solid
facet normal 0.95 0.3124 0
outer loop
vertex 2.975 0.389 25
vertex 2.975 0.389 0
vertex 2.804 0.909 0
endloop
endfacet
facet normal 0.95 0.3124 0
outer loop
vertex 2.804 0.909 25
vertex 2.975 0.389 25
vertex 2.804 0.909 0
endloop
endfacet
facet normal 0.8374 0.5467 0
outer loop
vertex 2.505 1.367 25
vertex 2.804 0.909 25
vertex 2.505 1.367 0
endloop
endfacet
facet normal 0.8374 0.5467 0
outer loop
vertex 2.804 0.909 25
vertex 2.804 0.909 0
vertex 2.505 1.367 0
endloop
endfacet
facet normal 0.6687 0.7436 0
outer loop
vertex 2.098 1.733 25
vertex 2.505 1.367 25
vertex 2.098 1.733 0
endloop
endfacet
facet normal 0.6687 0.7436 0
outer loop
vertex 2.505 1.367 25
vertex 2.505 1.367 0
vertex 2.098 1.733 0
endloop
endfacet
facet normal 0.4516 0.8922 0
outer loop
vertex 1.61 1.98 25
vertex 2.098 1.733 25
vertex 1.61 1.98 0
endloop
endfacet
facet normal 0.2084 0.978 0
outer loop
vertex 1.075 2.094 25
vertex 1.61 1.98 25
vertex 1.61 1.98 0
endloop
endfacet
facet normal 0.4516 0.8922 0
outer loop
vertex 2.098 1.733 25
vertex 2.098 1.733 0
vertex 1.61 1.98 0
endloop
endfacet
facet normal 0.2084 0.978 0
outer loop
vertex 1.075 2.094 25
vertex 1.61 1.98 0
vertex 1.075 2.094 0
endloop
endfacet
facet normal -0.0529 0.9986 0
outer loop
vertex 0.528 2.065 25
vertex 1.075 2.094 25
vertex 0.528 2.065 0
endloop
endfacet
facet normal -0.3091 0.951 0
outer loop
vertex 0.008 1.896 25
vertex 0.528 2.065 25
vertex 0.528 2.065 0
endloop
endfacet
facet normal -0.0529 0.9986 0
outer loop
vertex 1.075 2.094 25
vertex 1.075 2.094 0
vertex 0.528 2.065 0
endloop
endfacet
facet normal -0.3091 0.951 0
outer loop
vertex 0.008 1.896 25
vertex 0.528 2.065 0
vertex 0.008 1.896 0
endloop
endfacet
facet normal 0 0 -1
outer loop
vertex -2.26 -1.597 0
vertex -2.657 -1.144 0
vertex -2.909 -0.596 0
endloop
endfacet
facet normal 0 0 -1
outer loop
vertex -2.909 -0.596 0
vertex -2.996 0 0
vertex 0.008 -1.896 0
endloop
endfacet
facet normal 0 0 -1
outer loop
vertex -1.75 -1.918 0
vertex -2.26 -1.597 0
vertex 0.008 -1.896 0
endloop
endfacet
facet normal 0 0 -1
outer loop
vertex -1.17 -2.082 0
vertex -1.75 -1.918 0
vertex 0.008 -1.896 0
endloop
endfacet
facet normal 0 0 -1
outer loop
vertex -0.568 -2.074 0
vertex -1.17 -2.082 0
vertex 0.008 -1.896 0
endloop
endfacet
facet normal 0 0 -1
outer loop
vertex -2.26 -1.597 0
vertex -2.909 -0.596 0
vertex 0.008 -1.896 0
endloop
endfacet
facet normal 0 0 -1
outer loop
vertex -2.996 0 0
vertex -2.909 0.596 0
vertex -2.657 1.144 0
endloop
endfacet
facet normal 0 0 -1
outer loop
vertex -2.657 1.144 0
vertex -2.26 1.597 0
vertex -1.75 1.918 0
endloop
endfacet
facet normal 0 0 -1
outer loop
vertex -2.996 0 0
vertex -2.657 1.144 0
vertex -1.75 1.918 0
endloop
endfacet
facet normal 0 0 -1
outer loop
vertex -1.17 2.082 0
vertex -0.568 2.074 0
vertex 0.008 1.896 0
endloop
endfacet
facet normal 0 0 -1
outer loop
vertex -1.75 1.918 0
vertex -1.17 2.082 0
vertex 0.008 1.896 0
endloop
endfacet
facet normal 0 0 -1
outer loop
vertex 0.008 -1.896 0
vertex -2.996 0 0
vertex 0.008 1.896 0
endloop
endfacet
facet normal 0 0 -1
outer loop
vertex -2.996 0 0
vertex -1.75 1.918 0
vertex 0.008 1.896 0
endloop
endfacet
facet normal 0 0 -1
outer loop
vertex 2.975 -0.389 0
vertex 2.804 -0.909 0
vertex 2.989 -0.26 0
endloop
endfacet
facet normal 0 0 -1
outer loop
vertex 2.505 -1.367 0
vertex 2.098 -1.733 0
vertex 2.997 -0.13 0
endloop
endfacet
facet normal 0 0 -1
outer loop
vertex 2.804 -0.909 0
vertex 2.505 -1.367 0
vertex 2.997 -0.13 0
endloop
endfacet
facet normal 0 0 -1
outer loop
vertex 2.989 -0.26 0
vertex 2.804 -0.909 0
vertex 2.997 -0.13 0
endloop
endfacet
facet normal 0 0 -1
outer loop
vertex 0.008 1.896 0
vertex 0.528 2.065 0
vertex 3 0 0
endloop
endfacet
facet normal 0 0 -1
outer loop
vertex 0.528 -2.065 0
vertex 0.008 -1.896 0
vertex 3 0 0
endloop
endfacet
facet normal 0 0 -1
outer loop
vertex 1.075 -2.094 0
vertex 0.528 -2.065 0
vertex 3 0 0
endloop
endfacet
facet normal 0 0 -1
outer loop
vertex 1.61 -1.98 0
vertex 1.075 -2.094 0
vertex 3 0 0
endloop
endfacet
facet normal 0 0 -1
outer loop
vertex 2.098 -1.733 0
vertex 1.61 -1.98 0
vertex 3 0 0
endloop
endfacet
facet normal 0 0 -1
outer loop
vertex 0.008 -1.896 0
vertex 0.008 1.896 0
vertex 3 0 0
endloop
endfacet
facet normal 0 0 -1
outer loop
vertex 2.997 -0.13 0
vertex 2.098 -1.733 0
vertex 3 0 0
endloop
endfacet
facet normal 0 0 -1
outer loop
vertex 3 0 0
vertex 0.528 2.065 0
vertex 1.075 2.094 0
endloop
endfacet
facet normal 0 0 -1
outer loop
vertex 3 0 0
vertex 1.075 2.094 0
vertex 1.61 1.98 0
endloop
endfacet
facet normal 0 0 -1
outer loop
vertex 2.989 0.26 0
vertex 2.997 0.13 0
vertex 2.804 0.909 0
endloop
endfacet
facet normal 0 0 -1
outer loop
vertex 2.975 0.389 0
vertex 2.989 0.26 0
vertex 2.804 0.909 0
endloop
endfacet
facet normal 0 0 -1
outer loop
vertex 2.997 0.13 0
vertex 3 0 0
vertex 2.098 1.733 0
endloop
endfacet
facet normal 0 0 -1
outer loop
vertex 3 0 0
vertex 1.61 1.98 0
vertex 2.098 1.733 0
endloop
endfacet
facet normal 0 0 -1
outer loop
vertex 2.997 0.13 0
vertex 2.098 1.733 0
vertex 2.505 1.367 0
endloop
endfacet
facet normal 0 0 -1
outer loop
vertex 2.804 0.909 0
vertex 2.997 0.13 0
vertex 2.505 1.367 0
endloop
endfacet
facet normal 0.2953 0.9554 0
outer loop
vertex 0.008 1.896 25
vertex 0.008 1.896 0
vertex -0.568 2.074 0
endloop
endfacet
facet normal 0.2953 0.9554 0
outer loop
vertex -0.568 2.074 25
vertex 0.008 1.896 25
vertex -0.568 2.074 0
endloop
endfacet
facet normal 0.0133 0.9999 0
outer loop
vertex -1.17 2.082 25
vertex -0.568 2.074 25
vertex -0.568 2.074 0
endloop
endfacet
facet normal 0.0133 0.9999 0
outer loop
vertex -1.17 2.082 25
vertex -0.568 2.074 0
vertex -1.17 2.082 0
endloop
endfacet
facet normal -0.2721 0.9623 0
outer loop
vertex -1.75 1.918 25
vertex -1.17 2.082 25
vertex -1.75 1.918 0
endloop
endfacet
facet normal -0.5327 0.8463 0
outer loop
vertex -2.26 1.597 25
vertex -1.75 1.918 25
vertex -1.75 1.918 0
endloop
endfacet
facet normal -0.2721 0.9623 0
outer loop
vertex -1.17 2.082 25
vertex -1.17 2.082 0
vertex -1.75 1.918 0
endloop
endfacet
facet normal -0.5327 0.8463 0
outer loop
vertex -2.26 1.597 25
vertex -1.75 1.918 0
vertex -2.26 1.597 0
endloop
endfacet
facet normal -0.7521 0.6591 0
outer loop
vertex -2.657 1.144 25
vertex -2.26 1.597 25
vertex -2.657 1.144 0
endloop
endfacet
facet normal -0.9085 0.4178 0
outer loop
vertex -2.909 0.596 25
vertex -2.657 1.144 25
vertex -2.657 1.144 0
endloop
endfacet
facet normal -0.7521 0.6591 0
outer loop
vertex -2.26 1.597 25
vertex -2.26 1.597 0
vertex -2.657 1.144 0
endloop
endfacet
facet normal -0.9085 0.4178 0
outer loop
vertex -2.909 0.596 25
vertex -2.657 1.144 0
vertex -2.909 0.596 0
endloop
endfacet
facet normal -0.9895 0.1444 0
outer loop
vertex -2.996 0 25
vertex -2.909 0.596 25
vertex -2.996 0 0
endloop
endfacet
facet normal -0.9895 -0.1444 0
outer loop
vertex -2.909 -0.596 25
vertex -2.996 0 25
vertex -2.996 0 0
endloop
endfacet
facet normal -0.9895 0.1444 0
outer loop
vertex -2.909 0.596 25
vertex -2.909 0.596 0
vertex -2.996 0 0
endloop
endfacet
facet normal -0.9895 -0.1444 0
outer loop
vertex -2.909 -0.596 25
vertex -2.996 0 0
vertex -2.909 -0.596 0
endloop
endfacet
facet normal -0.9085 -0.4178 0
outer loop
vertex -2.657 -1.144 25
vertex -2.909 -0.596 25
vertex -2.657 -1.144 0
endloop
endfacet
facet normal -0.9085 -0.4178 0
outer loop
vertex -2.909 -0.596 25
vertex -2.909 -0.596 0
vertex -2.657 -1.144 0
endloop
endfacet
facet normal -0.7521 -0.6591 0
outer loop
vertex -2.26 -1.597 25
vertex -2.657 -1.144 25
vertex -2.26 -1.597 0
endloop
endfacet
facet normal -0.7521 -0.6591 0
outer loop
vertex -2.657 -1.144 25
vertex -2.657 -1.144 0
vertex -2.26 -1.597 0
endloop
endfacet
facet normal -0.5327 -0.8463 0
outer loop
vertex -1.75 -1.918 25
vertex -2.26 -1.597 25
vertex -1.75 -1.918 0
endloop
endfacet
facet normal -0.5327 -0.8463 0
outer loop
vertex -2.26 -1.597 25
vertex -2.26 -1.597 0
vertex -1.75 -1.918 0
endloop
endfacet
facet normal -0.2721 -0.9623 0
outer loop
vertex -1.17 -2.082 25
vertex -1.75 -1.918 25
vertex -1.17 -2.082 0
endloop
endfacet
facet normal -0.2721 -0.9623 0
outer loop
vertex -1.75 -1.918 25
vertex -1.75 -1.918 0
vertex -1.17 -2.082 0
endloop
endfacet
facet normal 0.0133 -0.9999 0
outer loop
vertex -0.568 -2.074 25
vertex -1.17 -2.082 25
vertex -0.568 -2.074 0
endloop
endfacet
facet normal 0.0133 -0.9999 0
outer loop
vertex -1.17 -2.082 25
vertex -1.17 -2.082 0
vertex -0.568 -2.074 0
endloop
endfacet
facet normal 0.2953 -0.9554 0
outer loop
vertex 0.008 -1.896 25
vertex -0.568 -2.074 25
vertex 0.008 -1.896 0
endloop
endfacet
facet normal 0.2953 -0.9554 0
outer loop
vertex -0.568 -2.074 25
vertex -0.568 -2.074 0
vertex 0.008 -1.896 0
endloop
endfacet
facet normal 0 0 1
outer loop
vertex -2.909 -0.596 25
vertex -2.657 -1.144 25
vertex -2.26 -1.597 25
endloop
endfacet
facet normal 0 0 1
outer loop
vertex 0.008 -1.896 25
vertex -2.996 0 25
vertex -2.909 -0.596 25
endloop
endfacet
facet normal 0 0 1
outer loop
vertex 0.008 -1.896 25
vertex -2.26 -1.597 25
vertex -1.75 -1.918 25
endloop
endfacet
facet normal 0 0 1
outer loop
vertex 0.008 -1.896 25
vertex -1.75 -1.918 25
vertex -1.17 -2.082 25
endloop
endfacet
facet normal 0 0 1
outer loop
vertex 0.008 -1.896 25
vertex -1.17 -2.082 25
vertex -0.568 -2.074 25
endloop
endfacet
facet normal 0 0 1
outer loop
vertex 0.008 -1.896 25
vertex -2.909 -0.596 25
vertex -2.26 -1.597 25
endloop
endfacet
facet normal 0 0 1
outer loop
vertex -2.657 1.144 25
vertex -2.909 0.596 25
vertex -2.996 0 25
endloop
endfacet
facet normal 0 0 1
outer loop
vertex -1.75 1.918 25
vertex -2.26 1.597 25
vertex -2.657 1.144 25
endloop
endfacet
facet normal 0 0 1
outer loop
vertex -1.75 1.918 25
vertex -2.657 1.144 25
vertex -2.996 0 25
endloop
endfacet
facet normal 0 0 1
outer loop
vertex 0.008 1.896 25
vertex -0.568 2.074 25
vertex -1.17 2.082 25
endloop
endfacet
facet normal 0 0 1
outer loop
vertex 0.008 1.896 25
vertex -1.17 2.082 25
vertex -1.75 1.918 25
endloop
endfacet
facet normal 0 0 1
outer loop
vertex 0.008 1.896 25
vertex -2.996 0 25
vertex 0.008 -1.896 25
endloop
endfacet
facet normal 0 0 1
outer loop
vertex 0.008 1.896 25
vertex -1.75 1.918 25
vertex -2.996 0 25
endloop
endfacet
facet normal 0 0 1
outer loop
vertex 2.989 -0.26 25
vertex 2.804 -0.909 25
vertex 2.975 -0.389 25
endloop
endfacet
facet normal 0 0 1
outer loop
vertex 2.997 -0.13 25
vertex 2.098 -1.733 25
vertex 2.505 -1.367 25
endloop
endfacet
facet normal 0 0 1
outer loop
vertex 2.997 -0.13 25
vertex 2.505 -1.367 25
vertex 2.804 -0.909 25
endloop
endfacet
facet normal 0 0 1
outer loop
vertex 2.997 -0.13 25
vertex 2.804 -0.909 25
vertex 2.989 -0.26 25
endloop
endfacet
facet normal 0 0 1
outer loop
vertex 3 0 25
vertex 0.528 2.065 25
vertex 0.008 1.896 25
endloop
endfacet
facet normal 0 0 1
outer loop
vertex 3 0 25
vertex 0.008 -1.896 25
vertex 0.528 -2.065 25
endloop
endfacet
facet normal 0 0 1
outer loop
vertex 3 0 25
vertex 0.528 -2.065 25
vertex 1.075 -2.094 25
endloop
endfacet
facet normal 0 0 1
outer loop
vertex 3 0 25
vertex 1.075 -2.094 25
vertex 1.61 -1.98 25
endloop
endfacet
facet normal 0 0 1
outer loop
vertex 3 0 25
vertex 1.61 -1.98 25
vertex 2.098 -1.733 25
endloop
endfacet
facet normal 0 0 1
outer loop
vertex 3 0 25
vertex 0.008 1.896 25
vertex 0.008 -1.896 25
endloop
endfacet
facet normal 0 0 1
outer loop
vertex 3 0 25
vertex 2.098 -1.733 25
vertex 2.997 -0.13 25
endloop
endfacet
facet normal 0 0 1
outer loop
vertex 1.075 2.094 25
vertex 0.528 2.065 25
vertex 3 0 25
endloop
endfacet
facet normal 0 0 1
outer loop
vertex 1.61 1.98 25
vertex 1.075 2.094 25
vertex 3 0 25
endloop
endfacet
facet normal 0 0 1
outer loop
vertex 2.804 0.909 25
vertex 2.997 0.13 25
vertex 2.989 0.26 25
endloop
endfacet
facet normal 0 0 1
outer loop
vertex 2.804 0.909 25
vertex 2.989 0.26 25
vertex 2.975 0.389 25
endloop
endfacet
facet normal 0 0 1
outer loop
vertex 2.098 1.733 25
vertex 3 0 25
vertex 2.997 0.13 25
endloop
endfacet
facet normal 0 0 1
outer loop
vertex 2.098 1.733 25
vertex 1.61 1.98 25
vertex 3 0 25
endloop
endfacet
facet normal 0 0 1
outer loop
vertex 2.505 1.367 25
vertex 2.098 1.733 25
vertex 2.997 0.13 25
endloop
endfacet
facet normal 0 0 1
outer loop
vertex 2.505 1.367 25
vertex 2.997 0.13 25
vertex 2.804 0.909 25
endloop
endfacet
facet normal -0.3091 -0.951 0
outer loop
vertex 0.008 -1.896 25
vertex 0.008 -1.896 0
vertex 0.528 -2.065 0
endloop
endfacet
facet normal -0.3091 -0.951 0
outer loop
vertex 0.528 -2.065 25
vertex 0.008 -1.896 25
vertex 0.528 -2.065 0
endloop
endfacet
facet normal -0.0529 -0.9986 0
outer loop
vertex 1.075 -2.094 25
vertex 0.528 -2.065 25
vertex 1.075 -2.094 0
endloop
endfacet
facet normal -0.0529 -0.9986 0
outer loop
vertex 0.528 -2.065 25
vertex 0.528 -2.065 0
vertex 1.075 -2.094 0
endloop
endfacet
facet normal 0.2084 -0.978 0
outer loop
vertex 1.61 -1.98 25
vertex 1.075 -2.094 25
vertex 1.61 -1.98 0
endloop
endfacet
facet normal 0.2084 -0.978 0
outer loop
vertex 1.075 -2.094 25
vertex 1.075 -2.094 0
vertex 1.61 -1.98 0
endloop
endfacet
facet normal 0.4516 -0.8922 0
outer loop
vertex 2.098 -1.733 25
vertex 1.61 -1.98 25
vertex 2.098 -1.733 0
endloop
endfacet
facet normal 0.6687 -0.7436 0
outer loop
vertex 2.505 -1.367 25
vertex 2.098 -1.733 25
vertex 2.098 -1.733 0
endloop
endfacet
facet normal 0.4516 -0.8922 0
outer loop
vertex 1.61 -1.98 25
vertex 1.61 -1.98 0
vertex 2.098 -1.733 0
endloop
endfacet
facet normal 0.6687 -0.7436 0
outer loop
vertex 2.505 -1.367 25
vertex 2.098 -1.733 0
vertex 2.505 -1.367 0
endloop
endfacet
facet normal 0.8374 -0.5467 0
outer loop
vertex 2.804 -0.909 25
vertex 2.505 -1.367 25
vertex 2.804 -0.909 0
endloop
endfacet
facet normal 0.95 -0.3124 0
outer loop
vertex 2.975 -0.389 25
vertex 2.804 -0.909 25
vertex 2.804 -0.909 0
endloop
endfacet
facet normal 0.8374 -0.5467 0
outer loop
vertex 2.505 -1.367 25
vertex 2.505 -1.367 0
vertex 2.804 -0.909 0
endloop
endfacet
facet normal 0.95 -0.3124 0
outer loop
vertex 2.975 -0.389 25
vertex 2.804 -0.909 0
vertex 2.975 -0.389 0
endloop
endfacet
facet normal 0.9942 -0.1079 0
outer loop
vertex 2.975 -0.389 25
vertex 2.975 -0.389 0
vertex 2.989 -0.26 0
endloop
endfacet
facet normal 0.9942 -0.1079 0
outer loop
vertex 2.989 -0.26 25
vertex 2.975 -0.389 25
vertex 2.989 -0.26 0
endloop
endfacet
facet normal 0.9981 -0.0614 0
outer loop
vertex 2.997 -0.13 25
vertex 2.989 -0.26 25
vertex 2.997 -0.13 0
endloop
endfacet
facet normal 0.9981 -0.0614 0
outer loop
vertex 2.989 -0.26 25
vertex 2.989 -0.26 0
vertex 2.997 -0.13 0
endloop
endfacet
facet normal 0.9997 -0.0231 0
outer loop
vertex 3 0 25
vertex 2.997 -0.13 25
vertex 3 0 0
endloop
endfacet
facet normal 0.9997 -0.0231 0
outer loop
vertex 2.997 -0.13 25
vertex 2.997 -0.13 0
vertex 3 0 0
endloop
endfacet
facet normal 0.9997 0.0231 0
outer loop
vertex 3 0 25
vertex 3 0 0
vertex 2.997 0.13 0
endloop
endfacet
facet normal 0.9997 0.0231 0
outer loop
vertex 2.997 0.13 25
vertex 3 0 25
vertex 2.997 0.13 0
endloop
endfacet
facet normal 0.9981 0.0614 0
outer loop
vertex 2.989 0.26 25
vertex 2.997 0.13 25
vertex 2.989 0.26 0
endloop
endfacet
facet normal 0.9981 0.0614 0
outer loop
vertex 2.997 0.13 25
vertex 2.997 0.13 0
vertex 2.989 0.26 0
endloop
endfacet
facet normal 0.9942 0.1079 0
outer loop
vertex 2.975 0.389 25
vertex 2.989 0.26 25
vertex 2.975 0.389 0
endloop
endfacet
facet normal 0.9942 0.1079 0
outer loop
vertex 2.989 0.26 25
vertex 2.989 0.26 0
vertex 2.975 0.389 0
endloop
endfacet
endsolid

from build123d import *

# Parameters (mm, degrees)
F1_DEPTH = 25


with BuildPart() as f1:
    # F0 (on Top) → F1 (new body)
    with BuildSketch(Plane.XY):
        with BuildLine():
            ThreePointArc((2.9746431824, -0.3892273592), (2.9936540838, -0.1950262196), (3, 0))
            ThreePointArc((3, 0), (2.9936540838, 0.1950262196), (2.9746431824, 0.3892273592))
            ThreePointArc((2.9746431824, 0.3892273592), (1.8618249989, 1.8724282704), (0.0077205477, 1.8957935577))
            ThreePointArc((0.0077205477, 1.8957935577), (0.8802141699, 1.1209485987), (1.2044117487, 0))
            ThreePointArc((1.2044117487, 0), (0.8802141699, -1.1209485987), (0.0077205477, -1.8957935577))
            ThreePointArc((0.0077205477, -1.8957935577), (1.8618249989, -1.8724282704), (2.9746431824, -0.3892273592))
        make_face()
        with BuildLine():
            ThreePointArc((0.0077205477, -1.8957935577), (-1.1889706532, 0), (0.0077205477, 1.8957935577))
            ThreePointArc((0.0077205477, 1.8957935577), (-2.9955882513, 0), (0.0077205477, -1.8957935577))
        make_face()
        with BuildLine():
            ThreePointArc((1.2044117487, 0), (0.8802141699, 1.1209485987), (0.0077205477, 1.8957935577))
            ThreePointArc((0.0077205477, 1.8957935577), (-1.1889706532, 0), (0.0077205477, -1.8957935577))
            ThreePointArc((0.0077205477, -1.8957935577), (0.8802141699, -1.1209485987), (1.2044117487, 0))
        make_face()
    extrude(amount=F1_DEPTH)


solid = f1.part
